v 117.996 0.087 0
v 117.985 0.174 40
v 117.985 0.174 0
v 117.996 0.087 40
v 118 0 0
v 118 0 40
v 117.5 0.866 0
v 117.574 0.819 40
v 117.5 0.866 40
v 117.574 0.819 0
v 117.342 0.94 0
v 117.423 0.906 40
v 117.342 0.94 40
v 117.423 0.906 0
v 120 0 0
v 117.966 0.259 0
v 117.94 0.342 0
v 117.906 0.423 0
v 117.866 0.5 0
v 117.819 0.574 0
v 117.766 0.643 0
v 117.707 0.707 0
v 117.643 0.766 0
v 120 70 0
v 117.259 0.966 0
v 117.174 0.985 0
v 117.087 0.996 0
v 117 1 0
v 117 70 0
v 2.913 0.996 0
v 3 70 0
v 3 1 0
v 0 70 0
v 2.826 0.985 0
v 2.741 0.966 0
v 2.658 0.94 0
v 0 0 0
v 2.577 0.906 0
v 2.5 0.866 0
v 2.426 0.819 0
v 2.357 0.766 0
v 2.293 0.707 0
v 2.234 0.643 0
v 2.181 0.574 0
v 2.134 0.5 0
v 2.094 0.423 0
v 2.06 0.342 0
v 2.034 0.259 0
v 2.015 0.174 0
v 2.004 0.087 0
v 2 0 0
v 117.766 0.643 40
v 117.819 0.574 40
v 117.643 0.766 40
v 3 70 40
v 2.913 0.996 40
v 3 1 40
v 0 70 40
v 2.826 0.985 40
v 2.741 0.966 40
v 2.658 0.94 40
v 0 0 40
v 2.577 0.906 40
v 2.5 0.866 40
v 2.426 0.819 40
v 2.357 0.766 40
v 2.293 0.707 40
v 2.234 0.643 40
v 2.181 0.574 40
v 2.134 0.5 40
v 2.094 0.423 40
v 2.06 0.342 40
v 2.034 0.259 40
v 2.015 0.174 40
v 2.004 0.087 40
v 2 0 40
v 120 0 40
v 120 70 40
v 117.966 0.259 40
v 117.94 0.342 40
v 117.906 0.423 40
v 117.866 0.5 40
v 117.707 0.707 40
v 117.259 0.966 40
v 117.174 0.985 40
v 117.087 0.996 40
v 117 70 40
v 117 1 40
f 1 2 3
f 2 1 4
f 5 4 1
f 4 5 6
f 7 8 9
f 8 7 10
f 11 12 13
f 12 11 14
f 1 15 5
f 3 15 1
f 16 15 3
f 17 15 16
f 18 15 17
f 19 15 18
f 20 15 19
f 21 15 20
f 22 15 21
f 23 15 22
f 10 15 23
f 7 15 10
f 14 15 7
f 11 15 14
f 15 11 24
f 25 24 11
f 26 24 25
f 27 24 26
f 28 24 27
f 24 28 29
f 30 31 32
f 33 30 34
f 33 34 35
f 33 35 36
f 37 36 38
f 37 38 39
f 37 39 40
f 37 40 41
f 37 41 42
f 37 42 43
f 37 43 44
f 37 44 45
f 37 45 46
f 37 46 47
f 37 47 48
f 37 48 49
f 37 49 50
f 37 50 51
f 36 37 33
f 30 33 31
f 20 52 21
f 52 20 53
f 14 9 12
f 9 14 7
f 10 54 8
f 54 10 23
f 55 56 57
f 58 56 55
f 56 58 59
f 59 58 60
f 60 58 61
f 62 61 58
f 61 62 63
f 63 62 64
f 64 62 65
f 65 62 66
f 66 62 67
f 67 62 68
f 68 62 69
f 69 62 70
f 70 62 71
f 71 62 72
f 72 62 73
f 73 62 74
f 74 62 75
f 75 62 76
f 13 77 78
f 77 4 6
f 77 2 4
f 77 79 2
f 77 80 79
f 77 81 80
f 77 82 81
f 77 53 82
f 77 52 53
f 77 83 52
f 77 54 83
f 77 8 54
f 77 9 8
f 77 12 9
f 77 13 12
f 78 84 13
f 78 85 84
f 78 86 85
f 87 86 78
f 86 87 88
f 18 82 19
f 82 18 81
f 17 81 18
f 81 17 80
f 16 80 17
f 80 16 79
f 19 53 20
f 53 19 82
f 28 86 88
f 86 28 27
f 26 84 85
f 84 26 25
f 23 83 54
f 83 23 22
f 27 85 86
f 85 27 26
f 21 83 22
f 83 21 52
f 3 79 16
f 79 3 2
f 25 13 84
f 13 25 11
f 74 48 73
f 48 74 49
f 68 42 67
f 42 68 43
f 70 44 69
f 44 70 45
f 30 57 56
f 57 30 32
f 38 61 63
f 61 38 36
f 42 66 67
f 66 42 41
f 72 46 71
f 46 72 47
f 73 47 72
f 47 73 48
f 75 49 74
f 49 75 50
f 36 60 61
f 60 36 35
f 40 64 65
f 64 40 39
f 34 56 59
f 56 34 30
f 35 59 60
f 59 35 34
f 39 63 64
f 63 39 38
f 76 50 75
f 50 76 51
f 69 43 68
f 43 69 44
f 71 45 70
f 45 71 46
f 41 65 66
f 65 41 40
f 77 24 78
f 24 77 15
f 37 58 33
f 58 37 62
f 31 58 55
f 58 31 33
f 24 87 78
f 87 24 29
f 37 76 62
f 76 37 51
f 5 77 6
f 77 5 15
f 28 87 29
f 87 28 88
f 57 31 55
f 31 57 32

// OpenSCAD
// Buffer tank for a mini horizontal gel-electrophoresis box. Open-top rectangular tank with a
// solid raised platform for the gel tray that divides the bottom into two buffer chambers. Each
// end wall gets a horizontal 2 mm hole along X at y = 0, z = 30 for the electrode wires.
//

X  = 120;
Y  = 70;
Z  = 40;
w  = 3;
floor = 3;
platform_L = 60;
platform_h = 10;

$fn = 64;

inner_X = X - 2 * w;
inner_Z = Z - floor;

difference() {
    cube([X, Y, Z]);
    translate([w, 0, floor]) cube([inner_X, Y, inner_Z]);     // hollow out the volume above the floor
    translate([w, 0, 0]) cube([inner_X, Y, w]);                 // remove the top layer so the tank is open

    // raised platform for the gel tray: full width (Y), length platform_L centred in X, top at
    // z = floor + platform_h
    translate([X / 2 - platform_L / 2, 0, floor])
        cube([platform_L, Y, platform_h]);

    // electrode holes: a 2 mm diameter horizontal hole along X at y = 0, z = 30 in each end wall
    for (x = [X - w, w]) {
        translate([x, 0, 0])
            cylinder(h = Z, d = 2, $fn = 72);                  // horizontal through the X length of the wall
    }
}
